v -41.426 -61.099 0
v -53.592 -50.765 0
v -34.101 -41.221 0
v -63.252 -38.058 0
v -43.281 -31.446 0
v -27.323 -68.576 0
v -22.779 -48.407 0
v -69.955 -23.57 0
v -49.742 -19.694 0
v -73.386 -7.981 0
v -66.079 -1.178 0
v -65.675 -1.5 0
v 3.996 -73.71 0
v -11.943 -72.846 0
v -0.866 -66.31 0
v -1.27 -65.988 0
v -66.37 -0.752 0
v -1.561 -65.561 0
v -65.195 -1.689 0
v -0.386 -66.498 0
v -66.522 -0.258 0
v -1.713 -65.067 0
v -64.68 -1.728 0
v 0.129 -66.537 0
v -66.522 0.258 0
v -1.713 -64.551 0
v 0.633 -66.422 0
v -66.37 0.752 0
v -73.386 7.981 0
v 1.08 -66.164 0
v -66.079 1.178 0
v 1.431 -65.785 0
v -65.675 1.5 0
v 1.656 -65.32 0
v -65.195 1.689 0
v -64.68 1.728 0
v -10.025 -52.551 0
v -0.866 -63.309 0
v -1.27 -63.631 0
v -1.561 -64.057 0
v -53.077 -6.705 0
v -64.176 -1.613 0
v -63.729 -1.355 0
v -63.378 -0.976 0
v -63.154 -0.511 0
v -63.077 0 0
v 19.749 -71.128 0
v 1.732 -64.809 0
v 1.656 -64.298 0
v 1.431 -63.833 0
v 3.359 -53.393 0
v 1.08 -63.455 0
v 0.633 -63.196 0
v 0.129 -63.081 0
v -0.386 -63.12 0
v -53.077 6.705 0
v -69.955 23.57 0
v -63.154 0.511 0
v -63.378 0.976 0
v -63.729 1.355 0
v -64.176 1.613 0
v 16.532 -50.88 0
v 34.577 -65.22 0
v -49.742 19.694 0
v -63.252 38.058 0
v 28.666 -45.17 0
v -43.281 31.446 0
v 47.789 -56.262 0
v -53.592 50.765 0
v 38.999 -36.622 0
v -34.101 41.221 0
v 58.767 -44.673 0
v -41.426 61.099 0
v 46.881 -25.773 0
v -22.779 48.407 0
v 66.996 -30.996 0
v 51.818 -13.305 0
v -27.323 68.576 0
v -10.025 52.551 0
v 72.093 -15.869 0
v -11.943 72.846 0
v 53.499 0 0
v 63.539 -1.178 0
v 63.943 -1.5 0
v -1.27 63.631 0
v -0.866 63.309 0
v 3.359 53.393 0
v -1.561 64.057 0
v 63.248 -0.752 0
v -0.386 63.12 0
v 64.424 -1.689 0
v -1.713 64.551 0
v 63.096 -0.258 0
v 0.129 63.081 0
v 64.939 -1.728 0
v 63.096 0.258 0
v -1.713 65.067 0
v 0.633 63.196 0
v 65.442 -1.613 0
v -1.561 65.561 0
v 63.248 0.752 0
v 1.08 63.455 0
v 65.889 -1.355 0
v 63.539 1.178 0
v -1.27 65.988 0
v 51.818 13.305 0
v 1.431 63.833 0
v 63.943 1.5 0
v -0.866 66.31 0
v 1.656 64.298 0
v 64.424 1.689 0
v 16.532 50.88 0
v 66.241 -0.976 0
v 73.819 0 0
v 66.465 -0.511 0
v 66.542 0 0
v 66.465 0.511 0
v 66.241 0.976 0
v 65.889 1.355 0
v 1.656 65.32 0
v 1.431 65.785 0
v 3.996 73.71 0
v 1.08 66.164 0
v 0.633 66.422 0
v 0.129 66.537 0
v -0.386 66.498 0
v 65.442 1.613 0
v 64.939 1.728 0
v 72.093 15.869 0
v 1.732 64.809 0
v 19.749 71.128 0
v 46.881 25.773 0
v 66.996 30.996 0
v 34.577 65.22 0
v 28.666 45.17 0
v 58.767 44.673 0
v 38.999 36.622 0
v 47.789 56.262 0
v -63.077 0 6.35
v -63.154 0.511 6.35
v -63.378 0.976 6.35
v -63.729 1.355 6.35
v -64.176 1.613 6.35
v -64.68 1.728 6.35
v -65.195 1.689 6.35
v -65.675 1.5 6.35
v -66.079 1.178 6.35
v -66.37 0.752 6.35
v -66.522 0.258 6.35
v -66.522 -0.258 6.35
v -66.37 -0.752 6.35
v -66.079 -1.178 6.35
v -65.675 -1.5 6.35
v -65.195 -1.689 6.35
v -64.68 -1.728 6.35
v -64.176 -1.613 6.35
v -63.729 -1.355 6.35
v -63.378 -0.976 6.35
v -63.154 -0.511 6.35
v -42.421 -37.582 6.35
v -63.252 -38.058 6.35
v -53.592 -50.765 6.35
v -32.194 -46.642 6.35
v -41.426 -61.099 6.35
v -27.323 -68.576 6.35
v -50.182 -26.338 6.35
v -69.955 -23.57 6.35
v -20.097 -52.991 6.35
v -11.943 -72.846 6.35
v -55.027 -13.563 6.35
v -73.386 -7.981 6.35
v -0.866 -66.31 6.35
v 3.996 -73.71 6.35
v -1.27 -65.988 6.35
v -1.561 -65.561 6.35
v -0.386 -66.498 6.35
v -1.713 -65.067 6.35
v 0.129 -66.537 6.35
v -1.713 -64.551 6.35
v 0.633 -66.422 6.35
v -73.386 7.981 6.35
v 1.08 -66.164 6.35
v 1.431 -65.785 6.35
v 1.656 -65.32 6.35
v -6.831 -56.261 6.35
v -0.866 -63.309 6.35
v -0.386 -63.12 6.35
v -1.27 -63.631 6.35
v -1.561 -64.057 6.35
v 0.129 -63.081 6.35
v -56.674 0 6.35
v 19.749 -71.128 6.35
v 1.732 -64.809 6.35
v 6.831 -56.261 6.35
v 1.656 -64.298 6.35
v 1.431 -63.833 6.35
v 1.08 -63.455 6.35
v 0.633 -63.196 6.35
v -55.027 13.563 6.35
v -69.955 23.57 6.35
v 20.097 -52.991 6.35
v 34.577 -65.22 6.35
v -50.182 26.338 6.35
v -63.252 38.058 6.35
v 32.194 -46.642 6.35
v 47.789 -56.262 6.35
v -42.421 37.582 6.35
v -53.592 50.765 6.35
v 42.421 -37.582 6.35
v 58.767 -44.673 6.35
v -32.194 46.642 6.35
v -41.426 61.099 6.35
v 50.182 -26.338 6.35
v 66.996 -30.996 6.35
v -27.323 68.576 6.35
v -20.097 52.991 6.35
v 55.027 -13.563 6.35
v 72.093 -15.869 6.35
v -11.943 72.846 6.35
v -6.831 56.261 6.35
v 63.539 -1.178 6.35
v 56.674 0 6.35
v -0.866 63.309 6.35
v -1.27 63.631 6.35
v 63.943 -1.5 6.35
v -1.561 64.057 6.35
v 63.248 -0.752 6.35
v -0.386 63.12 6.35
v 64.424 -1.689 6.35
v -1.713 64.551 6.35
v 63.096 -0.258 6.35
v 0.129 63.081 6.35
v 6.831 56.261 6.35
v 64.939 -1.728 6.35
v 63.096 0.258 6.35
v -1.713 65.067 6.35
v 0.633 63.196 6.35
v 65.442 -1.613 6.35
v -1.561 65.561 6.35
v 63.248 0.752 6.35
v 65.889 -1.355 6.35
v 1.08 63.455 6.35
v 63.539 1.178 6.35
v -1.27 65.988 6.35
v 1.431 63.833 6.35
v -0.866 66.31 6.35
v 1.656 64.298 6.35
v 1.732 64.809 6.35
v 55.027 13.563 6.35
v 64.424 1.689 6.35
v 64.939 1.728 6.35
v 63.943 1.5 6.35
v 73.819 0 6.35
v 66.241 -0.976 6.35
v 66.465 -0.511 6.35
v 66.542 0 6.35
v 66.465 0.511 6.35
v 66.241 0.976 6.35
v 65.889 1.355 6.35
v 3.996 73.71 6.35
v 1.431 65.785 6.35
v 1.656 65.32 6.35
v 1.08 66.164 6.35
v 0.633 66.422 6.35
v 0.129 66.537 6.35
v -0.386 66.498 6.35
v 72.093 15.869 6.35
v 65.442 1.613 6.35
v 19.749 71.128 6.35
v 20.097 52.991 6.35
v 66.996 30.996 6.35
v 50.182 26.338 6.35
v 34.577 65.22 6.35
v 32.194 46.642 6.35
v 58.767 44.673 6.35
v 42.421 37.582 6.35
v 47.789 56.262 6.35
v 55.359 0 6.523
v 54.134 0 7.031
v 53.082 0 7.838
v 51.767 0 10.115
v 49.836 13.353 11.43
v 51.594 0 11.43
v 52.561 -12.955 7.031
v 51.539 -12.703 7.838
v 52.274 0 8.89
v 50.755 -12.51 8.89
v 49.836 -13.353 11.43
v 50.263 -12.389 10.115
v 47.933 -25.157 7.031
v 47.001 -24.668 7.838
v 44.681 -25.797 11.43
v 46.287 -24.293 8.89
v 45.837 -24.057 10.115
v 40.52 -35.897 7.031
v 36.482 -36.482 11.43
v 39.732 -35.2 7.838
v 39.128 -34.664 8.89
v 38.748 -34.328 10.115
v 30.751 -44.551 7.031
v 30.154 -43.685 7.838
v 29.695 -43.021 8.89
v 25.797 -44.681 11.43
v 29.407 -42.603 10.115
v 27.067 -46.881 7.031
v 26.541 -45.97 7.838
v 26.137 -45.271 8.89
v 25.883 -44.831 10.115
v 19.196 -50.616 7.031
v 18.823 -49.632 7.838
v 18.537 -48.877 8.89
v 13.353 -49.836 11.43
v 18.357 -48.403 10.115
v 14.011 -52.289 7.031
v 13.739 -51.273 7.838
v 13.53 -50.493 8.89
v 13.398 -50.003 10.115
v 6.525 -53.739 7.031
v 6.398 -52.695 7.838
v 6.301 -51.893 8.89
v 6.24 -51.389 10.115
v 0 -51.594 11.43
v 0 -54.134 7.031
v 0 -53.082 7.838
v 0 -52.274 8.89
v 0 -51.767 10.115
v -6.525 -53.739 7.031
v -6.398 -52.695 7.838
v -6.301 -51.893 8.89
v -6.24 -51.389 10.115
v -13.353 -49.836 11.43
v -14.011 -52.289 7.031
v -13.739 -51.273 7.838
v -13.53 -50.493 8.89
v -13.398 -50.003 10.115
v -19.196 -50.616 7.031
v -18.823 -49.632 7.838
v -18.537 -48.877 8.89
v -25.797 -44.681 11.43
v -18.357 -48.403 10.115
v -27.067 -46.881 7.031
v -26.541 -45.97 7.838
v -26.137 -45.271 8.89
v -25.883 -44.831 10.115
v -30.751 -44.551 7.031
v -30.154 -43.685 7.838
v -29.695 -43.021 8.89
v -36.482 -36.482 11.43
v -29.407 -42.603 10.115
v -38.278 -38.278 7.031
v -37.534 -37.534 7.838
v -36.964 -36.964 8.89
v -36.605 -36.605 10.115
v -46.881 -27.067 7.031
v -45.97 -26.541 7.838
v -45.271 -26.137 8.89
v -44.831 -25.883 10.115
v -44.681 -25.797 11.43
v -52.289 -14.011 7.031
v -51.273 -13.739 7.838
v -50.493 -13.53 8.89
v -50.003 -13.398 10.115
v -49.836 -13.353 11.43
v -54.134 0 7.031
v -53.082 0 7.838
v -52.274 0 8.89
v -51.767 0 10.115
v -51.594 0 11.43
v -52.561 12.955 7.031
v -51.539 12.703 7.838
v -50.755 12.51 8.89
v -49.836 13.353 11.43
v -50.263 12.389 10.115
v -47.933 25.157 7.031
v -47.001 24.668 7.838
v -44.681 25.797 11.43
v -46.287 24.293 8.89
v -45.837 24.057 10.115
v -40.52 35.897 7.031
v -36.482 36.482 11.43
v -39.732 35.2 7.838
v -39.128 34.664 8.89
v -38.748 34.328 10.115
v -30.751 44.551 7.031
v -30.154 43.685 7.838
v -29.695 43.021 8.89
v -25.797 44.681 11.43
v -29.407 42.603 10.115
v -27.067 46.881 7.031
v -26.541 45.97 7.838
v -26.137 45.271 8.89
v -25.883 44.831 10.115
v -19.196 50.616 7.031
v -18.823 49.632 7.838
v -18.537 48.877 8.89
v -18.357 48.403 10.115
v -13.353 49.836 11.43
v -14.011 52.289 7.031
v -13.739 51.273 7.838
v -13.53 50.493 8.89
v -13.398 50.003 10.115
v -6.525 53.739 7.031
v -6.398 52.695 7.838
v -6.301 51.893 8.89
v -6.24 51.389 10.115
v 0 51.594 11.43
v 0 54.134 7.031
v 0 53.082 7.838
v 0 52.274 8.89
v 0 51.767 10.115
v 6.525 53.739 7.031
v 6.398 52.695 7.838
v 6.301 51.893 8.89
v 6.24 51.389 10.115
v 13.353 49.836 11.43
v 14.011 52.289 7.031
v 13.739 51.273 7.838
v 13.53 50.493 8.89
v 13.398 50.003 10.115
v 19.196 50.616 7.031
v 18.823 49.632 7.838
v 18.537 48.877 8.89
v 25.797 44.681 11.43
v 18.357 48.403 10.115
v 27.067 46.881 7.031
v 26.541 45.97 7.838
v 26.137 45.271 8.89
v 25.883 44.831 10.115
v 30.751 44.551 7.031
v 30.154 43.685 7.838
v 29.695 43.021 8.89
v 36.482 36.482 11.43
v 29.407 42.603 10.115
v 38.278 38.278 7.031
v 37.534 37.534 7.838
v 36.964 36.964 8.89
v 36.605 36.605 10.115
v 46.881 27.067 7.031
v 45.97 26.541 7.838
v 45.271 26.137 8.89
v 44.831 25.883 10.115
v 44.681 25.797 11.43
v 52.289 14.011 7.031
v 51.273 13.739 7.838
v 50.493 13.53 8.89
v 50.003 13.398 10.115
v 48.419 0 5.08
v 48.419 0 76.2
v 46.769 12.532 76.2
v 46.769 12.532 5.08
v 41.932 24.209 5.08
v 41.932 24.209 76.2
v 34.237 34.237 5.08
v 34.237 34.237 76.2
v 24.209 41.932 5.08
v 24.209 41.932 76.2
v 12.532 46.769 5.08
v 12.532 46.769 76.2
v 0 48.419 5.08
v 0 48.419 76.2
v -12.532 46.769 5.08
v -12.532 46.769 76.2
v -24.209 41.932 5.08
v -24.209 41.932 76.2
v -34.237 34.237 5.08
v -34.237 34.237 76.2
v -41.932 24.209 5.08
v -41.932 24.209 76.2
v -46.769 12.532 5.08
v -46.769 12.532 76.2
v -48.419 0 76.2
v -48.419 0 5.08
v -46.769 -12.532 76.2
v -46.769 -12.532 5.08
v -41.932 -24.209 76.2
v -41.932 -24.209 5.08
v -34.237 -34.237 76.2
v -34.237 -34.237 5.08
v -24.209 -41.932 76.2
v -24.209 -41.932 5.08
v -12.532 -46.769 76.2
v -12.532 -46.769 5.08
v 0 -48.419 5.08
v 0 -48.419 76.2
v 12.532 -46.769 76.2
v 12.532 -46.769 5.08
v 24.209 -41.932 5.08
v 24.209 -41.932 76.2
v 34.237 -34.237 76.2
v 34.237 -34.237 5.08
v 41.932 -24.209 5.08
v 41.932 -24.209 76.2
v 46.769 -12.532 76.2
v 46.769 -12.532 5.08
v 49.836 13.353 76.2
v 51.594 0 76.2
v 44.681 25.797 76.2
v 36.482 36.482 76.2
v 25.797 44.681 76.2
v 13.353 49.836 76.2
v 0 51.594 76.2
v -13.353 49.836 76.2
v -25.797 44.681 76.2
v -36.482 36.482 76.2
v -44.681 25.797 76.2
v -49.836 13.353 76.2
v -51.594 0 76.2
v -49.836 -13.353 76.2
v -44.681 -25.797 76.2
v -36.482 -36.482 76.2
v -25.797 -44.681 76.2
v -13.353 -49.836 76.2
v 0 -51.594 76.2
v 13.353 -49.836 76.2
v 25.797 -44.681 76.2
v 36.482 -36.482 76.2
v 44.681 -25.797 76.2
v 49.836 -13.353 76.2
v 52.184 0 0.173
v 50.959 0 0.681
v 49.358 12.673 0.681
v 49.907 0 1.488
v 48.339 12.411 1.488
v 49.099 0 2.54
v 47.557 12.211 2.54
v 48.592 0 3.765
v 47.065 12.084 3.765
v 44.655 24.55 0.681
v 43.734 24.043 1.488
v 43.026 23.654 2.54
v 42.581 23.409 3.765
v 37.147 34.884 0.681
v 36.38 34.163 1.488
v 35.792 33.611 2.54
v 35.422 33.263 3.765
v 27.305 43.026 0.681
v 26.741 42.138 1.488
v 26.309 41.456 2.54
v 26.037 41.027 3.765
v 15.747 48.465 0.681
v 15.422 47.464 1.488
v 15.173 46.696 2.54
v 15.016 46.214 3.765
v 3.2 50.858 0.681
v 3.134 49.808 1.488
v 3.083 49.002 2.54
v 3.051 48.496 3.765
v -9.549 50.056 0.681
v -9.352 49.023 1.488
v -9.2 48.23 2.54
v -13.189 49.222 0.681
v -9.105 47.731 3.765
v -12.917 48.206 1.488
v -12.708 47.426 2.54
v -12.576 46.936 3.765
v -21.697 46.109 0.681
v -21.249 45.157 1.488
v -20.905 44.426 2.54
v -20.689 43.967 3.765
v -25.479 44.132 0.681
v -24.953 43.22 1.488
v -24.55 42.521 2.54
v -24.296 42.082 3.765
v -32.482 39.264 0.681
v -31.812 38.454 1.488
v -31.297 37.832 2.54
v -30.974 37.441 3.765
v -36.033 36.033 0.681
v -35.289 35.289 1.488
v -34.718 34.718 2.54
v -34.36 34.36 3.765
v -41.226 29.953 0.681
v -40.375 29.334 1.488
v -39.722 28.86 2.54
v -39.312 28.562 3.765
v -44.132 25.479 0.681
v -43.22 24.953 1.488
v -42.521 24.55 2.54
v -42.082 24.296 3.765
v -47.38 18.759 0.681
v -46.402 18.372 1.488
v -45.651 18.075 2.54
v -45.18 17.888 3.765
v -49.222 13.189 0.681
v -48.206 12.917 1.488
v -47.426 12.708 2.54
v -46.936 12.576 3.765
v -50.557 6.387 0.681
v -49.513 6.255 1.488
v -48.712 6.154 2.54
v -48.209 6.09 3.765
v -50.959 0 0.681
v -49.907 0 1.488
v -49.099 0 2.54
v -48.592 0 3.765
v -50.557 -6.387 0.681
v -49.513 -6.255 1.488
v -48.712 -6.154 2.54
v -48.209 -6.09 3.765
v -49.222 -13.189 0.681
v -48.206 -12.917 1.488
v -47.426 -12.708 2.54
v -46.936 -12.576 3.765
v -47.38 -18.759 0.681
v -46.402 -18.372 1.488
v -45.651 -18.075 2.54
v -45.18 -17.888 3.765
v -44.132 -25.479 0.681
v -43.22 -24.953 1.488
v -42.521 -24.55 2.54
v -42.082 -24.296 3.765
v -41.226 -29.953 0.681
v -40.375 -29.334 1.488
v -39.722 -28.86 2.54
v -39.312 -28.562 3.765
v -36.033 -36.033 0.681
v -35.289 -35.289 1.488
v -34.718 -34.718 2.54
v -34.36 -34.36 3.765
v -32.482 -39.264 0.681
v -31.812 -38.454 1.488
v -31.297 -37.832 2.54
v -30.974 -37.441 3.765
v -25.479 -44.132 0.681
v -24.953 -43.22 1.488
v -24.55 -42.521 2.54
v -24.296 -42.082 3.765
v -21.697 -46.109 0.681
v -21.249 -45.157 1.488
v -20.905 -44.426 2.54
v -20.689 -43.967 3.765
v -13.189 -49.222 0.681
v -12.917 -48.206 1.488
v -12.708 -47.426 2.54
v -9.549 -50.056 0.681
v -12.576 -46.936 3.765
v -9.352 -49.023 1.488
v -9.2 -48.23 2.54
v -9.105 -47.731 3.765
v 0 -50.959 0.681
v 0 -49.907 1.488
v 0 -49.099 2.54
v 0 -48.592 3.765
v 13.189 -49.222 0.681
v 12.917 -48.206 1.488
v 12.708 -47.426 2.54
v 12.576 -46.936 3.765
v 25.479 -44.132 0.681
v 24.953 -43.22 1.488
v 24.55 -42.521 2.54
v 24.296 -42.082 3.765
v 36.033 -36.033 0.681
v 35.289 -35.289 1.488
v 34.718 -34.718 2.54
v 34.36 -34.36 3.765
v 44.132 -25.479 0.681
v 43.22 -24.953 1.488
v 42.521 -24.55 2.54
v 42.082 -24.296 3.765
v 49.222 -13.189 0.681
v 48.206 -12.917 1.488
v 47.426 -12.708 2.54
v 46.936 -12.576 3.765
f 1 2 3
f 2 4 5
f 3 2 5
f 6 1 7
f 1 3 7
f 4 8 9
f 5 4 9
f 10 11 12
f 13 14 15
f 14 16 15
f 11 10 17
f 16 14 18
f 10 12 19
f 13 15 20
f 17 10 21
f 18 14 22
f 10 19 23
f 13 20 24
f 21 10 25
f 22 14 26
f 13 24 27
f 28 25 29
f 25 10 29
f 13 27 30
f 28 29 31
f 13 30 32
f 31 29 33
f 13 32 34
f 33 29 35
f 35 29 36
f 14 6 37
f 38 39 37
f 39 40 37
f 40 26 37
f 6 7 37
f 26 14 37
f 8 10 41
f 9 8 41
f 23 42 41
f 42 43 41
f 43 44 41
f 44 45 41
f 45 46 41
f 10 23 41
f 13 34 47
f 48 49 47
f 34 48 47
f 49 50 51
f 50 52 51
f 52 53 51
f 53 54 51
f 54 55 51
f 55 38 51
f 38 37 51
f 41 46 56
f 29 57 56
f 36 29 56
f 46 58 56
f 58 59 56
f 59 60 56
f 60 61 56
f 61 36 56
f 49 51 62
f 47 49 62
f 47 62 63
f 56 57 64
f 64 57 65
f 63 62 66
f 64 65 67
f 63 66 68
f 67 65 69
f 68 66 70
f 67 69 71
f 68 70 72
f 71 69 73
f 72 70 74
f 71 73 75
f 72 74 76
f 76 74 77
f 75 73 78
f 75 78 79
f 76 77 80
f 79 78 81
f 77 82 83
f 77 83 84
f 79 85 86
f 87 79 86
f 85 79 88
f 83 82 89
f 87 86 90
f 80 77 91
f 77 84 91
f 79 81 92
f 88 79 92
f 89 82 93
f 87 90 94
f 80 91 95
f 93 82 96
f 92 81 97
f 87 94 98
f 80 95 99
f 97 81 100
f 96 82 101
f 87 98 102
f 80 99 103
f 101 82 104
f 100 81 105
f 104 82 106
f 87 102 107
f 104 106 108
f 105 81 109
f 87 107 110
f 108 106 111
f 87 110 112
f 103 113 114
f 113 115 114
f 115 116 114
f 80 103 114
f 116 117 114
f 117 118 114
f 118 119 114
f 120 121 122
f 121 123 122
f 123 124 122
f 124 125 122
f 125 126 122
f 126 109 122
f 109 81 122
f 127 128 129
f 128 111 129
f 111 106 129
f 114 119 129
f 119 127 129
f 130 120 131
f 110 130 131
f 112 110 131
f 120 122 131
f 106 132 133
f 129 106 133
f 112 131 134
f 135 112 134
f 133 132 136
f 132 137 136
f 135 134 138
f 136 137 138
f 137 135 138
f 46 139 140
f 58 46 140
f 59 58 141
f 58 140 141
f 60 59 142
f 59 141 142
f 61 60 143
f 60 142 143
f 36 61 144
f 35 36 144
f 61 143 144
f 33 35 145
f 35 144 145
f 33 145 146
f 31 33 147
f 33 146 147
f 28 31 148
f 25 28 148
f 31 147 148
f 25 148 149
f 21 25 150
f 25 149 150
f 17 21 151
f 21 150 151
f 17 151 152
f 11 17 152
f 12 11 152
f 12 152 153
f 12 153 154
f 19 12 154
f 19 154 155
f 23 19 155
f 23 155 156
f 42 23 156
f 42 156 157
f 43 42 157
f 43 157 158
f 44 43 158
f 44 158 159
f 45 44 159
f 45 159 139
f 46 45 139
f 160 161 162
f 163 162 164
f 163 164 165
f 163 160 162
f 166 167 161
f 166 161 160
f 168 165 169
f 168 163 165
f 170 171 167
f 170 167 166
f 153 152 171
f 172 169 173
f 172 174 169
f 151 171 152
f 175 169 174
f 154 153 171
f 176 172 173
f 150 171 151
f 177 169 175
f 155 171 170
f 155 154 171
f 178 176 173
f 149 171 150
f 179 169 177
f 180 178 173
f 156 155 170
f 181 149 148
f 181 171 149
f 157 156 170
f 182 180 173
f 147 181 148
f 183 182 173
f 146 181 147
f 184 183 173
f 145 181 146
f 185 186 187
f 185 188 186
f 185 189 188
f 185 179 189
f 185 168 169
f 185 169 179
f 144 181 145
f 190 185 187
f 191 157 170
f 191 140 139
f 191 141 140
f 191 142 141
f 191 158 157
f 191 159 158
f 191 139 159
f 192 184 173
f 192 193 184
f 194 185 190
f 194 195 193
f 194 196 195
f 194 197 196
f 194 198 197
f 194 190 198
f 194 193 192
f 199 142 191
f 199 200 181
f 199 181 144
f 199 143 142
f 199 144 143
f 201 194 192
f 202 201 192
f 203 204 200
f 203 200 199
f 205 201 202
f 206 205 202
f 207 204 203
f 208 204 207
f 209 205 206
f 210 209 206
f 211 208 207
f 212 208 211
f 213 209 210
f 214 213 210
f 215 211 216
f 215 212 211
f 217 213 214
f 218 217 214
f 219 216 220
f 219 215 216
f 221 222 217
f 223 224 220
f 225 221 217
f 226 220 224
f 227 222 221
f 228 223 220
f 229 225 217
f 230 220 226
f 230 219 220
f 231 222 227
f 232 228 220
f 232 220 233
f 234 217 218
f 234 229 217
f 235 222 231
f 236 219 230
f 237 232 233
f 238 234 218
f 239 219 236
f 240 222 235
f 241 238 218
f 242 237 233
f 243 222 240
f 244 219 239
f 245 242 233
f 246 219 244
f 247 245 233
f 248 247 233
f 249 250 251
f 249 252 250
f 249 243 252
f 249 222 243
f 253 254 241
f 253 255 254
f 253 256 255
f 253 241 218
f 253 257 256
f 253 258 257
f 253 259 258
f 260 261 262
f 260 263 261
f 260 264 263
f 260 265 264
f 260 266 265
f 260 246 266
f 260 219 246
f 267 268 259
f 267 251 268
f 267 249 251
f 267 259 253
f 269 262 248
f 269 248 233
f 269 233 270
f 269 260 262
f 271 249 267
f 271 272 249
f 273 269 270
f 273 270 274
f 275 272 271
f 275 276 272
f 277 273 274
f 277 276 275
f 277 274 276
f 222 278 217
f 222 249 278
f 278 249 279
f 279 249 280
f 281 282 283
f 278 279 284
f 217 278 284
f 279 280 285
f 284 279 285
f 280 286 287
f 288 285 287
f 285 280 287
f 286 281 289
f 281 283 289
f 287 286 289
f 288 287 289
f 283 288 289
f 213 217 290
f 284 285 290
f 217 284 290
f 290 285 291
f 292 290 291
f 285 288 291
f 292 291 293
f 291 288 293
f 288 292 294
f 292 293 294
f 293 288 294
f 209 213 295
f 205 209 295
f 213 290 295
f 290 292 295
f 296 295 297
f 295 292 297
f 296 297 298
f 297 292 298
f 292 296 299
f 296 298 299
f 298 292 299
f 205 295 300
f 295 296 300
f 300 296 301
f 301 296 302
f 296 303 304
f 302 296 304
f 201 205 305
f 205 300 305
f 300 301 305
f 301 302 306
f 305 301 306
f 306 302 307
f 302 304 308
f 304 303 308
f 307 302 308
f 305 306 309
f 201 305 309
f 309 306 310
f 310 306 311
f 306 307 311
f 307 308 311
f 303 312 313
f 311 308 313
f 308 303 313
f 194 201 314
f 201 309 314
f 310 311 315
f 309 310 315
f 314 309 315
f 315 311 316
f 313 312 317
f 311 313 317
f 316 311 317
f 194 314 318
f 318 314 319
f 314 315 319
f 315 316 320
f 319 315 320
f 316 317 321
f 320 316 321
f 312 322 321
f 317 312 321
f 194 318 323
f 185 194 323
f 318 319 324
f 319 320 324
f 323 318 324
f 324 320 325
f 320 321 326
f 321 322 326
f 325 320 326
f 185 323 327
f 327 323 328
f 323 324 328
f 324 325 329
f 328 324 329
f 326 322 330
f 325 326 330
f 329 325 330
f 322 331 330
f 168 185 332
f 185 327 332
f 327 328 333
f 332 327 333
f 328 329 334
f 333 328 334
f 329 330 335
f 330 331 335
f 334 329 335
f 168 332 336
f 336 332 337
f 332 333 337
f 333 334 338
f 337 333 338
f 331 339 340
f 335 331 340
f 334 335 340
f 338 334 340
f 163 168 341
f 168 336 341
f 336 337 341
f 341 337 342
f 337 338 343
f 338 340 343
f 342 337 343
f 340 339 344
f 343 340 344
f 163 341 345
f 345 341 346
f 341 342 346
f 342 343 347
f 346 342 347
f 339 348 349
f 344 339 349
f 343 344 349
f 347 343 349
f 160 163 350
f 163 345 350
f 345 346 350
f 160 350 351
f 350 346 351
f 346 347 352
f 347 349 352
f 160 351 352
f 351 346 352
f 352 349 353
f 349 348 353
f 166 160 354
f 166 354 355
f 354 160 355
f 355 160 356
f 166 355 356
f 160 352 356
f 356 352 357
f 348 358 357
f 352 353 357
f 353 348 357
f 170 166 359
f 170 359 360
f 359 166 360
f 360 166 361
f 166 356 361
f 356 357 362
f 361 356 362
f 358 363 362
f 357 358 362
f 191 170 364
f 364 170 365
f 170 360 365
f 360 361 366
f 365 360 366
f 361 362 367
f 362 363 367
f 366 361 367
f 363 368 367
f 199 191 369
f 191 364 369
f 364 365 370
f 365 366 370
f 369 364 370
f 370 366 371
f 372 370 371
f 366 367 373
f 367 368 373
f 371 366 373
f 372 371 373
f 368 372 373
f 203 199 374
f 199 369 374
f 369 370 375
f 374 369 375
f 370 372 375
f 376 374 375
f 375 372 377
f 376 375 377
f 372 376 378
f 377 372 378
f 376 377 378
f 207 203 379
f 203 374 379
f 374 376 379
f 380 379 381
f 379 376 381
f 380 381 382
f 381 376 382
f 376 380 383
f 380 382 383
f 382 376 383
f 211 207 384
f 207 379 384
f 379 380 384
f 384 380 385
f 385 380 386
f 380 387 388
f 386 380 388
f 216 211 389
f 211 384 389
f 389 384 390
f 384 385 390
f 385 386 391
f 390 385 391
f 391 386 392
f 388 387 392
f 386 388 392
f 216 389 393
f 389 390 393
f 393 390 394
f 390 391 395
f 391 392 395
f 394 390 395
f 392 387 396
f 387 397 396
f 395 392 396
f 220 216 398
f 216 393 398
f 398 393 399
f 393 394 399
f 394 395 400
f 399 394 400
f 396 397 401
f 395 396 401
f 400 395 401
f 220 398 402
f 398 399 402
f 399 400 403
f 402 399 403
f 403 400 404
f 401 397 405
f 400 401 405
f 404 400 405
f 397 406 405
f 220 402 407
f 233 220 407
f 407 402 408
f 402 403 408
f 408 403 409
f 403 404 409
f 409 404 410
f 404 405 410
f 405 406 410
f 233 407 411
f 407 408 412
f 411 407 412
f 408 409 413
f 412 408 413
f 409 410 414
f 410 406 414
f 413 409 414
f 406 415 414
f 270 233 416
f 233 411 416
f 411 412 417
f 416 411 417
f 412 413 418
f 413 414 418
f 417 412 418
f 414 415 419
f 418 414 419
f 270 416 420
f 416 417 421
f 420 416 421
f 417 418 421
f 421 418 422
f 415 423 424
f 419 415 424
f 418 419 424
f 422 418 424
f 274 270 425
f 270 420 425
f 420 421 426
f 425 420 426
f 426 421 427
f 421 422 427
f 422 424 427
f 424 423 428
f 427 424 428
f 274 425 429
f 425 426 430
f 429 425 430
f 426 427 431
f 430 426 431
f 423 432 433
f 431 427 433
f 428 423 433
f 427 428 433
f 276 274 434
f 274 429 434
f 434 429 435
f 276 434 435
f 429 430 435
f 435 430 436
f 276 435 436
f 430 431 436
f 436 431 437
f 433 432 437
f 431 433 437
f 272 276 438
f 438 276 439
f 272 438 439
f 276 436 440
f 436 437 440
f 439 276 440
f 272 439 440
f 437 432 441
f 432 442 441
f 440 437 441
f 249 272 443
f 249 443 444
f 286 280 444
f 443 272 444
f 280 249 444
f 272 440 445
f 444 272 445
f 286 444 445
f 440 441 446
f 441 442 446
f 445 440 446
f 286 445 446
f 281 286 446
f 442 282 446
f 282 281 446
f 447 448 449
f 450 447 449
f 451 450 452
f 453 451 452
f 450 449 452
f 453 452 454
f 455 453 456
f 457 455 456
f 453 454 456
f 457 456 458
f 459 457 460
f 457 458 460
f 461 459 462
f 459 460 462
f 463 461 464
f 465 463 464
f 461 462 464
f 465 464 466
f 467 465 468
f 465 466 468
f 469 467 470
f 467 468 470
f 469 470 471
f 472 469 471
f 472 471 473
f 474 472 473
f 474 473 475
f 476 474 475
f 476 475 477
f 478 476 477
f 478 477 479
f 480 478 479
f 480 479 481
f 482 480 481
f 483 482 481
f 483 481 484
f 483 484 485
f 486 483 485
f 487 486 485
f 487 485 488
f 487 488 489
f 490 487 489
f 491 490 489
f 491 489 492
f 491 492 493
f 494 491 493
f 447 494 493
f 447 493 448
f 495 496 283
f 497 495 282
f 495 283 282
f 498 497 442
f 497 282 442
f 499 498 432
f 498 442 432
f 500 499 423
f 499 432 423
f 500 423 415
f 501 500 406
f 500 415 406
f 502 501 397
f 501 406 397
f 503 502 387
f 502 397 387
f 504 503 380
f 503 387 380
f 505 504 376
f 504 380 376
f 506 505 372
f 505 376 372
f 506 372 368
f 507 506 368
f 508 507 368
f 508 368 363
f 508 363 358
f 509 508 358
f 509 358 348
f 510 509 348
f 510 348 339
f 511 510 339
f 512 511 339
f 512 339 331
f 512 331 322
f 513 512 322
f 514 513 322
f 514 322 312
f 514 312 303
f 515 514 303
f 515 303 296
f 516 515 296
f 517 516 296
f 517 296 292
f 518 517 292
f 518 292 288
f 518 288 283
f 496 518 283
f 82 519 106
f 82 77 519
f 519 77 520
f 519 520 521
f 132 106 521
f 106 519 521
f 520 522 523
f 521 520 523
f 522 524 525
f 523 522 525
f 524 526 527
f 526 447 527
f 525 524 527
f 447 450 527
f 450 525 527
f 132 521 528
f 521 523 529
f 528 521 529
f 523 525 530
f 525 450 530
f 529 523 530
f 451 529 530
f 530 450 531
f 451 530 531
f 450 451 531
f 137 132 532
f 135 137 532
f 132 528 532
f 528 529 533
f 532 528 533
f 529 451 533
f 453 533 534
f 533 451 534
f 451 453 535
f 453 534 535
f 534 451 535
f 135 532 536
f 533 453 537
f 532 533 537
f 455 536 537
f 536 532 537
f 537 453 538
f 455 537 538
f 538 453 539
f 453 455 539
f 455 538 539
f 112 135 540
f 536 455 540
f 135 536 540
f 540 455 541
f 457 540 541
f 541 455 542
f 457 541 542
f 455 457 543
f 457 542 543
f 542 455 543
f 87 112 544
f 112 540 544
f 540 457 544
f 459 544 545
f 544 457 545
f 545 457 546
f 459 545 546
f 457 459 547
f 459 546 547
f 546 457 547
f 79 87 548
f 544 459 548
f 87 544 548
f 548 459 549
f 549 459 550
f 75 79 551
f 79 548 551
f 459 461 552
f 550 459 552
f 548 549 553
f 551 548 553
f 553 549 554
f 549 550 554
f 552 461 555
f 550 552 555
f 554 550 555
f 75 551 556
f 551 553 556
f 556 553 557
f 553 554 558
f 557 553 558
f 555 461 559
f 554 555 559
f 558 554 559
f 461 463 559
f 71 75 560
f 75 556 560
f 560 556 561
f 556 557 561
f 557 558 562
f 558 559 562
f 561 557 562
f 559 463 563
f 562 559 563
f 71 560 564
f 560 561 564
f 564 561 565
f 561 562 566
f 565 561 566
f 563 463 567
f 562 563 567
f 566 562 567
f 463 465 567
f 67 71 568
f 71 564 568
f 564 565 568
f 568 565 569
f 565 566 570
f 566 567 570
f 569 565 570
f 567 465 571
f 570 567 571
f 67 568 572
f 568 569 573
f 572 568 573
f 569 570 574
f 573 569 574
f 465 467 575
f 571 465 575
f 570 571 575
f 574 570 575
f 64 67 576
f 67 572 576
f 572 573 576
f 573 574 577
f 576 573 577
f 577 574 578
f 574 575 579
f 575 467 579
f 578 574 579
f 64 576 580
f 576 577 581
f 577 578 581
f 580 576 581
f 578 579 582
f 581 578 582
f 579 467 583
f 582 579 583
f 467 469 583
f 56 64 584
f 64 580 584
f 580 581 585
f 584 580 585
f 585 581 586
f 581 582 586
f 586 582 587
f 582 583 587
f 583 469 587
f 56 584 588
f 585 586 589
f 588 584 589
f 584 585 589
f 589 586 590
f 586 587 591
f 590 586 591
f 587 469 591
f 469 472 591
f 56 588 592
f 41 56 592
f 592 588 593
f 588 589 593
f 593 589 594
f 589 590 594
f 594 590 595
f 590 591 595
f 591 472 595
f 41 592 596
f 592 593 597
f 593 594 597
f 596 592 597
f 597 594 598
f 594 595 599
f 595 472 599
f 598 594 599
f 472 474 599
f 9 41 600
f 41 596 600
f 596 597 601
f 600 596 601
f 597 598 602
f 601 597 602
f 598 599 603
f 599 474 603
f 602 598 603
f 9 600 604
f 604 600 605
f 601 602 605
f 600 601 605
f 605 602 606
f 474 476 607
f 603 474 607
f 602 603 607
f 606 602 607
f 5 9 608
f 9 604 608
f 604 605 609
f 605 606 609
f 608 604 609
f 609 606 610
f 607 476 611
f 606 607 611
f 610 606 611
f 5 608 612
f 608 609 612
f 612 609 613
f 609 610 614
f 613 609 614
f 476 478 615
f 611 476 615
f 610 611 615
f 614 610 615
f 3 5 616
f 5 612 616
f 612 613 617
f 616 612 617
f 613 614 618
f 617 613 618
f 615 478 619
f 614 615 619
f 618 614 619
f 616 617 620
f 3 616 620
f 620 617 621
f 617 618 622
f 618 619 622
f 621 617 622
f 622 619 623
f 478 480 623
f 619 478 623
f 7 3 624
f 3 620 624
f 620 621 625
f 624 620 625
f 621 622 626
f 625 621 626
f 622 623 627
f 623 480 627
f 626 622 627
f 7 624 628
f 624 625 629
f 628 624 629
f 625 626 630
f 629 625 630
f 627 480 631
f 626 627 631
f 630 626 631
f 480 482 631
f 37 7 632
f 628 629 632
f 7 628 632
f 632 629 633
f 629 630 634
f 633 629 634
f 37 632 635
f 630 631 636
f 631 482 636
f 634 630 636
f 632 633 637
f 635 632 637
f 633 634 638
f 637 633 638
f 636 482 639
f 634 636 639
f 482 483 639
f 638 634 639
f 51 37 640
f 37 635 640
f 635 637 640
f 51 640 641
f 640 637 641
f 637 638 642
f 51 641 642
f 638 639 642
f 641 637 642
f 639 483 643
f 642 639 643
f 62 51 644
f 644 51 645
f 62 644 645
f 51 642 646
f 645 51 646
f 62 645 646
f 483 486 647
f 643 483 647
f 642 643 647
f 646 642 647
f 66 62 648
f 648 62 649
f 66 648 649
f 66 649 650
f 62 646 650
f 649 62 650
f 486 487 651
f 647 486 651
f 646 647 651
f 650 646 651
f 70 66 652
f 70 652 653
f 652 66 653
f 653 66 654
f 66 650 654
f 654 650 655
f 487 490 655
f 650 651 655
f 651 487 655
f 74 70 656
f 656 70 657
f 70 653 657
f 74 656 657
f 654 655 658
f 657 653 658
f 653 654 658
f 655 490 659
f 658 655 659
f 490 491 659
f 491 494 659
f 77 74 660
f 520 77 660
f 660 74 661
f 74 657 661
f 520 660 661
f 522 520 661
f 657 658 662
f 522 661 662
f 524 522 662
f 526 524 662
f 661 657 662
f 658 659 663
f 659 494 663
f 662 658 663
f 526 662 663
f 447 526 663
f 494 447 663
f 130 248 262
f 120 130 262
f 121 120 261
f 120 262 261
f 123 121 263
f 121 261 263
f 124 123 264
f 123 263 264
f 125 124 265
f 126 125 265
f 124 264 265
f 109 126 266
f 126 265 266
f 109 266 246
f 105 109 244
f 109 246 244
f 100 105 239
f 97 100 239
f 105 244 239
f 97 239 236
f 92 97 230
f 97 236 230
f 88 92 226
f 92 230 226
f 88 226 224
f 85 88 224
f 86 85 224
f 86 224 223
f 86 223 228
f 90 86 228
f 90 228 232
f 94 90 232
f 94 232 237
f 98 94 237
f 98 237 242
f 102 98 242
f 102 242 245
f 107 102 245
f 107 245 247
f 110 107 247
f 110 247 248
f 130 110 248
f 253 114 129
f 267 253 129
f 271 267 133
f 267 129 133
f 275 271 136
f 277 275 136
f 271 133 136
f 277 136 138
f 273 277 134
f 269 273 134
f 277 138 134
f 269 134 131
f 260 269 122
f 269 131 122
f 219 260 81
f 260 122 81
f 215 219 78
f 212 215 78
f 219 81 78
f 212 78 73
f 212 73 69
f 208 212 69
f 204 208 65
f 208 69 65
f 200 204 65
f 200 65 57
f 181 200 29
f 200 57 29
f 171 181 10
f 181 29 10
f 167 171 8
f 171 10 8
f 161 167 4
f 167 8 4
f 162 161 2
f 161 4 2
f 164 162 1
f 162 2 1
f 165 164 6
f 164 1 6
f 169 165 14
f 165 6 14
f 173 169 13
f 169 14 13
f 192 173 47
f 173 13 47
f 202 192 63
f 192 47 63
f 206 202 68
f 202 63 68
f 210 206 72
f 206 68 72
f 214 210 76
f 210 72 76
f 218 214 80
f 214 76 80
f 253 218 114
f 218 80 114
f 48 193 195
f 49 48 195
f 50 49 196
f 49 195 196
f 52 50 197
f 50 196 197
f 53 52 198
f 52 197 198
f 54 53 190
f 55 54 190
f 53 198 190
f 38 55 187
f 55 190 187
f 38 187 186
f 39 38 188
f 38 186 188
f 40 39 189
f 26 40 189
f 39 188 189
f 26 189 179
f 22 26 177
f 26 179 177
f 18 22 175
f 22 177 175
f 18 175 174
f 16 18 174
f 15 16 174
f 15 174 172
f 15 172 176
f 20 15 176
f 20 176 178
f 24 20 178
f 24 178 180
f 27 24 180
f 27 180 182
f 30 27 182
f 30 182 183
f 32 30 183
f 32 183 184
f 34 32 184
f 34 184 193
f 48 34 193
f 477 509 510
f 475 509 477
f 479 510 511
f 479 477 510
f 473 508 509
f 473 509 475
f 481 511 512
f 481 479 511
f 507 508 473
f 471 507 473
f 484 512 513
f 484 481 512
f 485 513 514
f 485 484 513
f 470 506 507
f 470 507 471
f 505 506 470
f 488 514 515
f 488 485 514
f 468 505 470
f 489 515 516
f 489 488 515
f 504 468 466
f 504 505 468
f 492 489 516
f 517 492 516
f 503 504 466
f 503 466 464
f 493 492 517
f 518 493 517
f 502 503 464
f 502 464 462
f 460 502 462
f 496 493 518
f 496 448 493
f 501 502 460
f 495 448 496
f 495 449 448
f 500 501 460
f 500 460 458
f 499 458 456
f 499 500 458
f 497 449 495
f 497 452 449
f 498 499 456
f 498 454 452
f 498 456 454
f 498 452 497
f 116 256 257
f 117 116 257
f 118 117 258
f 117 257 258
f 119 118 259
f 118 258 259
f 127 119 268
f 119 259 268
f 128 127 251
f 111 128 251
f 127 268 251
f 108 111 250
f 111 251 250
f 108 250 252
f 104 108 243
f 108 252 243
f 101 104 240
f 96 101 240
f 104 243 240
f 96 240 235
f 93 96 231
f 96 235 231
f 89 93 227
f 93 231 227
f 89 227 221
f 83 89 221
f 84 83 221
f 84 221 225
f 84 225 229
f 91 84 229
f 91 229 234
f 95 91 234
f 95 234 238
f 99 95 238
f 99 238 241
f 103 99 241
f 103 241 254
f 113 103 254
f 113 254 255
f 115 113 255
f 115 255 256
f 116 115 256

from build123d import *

# Parameters (mm, degrees)
F0_R     = 51.59375
F1_DEPTH = 76.2
F2_R     = 73.81875
F3_DEPTH = 6.35
F4_R     = 48.41875
F5_DEPTH = 76.201
F6_R     = 5.08
F7_R     = 5.08
F8_R     = 1.732497
F9_DEPTH = 6.351


with BuildPart() as f1:
    # F0 (on Top) → F1 (new body)
    with BuildSketch(Plane.XY):
        Circle(F0_R)
    extrude(amount=F1_DEPTH)

    # F2 (on Top) → F3 (join)
    with BuildSketch(Plane.XY):
        Circle(F2_R)
    extrude(amount=F3_DEPTH)

    # F4 (on face) → F5 (cut, through all)
    with BuildSketch(Plane.XY.offset(76.2)):
        Circle(F4_R)
    extrude(amount=-F5_DEPTH, mode=Mode.SUBTRACT)

    # F6
    f6_edges = [f1.edges().sort_by_distance(p)[0] for p in [
        (-51.59375, 0, 6.35),
    ]]
    fillet(f6_edges, radius=F6_R)

    # F7
    f7_edges = [f1.edges().sort_by_distance(p)[0] for p in [
        (-48.41875, 0, 0),
    ]]
    fillet(f7_edges, radius=F7_R)

    # F8 (on face) → F9 (cut, through all)
    with BuildSketch(Plane.XY.offset(6.35)):
        with Locations((64.809114, 0)):
            Circle(F8_R)
        with Locations((0, 64.809114)):
            Circle(F8_R)
        with Locations((-64.809114, 0)):
            Circle(F8_R)
        with Locations((0, -64.809114)):
            Circle(F8_R)
    extrude(amount=-F9_DEPTH, mode=Mode.SUBTRACT)


solid = f1.part
